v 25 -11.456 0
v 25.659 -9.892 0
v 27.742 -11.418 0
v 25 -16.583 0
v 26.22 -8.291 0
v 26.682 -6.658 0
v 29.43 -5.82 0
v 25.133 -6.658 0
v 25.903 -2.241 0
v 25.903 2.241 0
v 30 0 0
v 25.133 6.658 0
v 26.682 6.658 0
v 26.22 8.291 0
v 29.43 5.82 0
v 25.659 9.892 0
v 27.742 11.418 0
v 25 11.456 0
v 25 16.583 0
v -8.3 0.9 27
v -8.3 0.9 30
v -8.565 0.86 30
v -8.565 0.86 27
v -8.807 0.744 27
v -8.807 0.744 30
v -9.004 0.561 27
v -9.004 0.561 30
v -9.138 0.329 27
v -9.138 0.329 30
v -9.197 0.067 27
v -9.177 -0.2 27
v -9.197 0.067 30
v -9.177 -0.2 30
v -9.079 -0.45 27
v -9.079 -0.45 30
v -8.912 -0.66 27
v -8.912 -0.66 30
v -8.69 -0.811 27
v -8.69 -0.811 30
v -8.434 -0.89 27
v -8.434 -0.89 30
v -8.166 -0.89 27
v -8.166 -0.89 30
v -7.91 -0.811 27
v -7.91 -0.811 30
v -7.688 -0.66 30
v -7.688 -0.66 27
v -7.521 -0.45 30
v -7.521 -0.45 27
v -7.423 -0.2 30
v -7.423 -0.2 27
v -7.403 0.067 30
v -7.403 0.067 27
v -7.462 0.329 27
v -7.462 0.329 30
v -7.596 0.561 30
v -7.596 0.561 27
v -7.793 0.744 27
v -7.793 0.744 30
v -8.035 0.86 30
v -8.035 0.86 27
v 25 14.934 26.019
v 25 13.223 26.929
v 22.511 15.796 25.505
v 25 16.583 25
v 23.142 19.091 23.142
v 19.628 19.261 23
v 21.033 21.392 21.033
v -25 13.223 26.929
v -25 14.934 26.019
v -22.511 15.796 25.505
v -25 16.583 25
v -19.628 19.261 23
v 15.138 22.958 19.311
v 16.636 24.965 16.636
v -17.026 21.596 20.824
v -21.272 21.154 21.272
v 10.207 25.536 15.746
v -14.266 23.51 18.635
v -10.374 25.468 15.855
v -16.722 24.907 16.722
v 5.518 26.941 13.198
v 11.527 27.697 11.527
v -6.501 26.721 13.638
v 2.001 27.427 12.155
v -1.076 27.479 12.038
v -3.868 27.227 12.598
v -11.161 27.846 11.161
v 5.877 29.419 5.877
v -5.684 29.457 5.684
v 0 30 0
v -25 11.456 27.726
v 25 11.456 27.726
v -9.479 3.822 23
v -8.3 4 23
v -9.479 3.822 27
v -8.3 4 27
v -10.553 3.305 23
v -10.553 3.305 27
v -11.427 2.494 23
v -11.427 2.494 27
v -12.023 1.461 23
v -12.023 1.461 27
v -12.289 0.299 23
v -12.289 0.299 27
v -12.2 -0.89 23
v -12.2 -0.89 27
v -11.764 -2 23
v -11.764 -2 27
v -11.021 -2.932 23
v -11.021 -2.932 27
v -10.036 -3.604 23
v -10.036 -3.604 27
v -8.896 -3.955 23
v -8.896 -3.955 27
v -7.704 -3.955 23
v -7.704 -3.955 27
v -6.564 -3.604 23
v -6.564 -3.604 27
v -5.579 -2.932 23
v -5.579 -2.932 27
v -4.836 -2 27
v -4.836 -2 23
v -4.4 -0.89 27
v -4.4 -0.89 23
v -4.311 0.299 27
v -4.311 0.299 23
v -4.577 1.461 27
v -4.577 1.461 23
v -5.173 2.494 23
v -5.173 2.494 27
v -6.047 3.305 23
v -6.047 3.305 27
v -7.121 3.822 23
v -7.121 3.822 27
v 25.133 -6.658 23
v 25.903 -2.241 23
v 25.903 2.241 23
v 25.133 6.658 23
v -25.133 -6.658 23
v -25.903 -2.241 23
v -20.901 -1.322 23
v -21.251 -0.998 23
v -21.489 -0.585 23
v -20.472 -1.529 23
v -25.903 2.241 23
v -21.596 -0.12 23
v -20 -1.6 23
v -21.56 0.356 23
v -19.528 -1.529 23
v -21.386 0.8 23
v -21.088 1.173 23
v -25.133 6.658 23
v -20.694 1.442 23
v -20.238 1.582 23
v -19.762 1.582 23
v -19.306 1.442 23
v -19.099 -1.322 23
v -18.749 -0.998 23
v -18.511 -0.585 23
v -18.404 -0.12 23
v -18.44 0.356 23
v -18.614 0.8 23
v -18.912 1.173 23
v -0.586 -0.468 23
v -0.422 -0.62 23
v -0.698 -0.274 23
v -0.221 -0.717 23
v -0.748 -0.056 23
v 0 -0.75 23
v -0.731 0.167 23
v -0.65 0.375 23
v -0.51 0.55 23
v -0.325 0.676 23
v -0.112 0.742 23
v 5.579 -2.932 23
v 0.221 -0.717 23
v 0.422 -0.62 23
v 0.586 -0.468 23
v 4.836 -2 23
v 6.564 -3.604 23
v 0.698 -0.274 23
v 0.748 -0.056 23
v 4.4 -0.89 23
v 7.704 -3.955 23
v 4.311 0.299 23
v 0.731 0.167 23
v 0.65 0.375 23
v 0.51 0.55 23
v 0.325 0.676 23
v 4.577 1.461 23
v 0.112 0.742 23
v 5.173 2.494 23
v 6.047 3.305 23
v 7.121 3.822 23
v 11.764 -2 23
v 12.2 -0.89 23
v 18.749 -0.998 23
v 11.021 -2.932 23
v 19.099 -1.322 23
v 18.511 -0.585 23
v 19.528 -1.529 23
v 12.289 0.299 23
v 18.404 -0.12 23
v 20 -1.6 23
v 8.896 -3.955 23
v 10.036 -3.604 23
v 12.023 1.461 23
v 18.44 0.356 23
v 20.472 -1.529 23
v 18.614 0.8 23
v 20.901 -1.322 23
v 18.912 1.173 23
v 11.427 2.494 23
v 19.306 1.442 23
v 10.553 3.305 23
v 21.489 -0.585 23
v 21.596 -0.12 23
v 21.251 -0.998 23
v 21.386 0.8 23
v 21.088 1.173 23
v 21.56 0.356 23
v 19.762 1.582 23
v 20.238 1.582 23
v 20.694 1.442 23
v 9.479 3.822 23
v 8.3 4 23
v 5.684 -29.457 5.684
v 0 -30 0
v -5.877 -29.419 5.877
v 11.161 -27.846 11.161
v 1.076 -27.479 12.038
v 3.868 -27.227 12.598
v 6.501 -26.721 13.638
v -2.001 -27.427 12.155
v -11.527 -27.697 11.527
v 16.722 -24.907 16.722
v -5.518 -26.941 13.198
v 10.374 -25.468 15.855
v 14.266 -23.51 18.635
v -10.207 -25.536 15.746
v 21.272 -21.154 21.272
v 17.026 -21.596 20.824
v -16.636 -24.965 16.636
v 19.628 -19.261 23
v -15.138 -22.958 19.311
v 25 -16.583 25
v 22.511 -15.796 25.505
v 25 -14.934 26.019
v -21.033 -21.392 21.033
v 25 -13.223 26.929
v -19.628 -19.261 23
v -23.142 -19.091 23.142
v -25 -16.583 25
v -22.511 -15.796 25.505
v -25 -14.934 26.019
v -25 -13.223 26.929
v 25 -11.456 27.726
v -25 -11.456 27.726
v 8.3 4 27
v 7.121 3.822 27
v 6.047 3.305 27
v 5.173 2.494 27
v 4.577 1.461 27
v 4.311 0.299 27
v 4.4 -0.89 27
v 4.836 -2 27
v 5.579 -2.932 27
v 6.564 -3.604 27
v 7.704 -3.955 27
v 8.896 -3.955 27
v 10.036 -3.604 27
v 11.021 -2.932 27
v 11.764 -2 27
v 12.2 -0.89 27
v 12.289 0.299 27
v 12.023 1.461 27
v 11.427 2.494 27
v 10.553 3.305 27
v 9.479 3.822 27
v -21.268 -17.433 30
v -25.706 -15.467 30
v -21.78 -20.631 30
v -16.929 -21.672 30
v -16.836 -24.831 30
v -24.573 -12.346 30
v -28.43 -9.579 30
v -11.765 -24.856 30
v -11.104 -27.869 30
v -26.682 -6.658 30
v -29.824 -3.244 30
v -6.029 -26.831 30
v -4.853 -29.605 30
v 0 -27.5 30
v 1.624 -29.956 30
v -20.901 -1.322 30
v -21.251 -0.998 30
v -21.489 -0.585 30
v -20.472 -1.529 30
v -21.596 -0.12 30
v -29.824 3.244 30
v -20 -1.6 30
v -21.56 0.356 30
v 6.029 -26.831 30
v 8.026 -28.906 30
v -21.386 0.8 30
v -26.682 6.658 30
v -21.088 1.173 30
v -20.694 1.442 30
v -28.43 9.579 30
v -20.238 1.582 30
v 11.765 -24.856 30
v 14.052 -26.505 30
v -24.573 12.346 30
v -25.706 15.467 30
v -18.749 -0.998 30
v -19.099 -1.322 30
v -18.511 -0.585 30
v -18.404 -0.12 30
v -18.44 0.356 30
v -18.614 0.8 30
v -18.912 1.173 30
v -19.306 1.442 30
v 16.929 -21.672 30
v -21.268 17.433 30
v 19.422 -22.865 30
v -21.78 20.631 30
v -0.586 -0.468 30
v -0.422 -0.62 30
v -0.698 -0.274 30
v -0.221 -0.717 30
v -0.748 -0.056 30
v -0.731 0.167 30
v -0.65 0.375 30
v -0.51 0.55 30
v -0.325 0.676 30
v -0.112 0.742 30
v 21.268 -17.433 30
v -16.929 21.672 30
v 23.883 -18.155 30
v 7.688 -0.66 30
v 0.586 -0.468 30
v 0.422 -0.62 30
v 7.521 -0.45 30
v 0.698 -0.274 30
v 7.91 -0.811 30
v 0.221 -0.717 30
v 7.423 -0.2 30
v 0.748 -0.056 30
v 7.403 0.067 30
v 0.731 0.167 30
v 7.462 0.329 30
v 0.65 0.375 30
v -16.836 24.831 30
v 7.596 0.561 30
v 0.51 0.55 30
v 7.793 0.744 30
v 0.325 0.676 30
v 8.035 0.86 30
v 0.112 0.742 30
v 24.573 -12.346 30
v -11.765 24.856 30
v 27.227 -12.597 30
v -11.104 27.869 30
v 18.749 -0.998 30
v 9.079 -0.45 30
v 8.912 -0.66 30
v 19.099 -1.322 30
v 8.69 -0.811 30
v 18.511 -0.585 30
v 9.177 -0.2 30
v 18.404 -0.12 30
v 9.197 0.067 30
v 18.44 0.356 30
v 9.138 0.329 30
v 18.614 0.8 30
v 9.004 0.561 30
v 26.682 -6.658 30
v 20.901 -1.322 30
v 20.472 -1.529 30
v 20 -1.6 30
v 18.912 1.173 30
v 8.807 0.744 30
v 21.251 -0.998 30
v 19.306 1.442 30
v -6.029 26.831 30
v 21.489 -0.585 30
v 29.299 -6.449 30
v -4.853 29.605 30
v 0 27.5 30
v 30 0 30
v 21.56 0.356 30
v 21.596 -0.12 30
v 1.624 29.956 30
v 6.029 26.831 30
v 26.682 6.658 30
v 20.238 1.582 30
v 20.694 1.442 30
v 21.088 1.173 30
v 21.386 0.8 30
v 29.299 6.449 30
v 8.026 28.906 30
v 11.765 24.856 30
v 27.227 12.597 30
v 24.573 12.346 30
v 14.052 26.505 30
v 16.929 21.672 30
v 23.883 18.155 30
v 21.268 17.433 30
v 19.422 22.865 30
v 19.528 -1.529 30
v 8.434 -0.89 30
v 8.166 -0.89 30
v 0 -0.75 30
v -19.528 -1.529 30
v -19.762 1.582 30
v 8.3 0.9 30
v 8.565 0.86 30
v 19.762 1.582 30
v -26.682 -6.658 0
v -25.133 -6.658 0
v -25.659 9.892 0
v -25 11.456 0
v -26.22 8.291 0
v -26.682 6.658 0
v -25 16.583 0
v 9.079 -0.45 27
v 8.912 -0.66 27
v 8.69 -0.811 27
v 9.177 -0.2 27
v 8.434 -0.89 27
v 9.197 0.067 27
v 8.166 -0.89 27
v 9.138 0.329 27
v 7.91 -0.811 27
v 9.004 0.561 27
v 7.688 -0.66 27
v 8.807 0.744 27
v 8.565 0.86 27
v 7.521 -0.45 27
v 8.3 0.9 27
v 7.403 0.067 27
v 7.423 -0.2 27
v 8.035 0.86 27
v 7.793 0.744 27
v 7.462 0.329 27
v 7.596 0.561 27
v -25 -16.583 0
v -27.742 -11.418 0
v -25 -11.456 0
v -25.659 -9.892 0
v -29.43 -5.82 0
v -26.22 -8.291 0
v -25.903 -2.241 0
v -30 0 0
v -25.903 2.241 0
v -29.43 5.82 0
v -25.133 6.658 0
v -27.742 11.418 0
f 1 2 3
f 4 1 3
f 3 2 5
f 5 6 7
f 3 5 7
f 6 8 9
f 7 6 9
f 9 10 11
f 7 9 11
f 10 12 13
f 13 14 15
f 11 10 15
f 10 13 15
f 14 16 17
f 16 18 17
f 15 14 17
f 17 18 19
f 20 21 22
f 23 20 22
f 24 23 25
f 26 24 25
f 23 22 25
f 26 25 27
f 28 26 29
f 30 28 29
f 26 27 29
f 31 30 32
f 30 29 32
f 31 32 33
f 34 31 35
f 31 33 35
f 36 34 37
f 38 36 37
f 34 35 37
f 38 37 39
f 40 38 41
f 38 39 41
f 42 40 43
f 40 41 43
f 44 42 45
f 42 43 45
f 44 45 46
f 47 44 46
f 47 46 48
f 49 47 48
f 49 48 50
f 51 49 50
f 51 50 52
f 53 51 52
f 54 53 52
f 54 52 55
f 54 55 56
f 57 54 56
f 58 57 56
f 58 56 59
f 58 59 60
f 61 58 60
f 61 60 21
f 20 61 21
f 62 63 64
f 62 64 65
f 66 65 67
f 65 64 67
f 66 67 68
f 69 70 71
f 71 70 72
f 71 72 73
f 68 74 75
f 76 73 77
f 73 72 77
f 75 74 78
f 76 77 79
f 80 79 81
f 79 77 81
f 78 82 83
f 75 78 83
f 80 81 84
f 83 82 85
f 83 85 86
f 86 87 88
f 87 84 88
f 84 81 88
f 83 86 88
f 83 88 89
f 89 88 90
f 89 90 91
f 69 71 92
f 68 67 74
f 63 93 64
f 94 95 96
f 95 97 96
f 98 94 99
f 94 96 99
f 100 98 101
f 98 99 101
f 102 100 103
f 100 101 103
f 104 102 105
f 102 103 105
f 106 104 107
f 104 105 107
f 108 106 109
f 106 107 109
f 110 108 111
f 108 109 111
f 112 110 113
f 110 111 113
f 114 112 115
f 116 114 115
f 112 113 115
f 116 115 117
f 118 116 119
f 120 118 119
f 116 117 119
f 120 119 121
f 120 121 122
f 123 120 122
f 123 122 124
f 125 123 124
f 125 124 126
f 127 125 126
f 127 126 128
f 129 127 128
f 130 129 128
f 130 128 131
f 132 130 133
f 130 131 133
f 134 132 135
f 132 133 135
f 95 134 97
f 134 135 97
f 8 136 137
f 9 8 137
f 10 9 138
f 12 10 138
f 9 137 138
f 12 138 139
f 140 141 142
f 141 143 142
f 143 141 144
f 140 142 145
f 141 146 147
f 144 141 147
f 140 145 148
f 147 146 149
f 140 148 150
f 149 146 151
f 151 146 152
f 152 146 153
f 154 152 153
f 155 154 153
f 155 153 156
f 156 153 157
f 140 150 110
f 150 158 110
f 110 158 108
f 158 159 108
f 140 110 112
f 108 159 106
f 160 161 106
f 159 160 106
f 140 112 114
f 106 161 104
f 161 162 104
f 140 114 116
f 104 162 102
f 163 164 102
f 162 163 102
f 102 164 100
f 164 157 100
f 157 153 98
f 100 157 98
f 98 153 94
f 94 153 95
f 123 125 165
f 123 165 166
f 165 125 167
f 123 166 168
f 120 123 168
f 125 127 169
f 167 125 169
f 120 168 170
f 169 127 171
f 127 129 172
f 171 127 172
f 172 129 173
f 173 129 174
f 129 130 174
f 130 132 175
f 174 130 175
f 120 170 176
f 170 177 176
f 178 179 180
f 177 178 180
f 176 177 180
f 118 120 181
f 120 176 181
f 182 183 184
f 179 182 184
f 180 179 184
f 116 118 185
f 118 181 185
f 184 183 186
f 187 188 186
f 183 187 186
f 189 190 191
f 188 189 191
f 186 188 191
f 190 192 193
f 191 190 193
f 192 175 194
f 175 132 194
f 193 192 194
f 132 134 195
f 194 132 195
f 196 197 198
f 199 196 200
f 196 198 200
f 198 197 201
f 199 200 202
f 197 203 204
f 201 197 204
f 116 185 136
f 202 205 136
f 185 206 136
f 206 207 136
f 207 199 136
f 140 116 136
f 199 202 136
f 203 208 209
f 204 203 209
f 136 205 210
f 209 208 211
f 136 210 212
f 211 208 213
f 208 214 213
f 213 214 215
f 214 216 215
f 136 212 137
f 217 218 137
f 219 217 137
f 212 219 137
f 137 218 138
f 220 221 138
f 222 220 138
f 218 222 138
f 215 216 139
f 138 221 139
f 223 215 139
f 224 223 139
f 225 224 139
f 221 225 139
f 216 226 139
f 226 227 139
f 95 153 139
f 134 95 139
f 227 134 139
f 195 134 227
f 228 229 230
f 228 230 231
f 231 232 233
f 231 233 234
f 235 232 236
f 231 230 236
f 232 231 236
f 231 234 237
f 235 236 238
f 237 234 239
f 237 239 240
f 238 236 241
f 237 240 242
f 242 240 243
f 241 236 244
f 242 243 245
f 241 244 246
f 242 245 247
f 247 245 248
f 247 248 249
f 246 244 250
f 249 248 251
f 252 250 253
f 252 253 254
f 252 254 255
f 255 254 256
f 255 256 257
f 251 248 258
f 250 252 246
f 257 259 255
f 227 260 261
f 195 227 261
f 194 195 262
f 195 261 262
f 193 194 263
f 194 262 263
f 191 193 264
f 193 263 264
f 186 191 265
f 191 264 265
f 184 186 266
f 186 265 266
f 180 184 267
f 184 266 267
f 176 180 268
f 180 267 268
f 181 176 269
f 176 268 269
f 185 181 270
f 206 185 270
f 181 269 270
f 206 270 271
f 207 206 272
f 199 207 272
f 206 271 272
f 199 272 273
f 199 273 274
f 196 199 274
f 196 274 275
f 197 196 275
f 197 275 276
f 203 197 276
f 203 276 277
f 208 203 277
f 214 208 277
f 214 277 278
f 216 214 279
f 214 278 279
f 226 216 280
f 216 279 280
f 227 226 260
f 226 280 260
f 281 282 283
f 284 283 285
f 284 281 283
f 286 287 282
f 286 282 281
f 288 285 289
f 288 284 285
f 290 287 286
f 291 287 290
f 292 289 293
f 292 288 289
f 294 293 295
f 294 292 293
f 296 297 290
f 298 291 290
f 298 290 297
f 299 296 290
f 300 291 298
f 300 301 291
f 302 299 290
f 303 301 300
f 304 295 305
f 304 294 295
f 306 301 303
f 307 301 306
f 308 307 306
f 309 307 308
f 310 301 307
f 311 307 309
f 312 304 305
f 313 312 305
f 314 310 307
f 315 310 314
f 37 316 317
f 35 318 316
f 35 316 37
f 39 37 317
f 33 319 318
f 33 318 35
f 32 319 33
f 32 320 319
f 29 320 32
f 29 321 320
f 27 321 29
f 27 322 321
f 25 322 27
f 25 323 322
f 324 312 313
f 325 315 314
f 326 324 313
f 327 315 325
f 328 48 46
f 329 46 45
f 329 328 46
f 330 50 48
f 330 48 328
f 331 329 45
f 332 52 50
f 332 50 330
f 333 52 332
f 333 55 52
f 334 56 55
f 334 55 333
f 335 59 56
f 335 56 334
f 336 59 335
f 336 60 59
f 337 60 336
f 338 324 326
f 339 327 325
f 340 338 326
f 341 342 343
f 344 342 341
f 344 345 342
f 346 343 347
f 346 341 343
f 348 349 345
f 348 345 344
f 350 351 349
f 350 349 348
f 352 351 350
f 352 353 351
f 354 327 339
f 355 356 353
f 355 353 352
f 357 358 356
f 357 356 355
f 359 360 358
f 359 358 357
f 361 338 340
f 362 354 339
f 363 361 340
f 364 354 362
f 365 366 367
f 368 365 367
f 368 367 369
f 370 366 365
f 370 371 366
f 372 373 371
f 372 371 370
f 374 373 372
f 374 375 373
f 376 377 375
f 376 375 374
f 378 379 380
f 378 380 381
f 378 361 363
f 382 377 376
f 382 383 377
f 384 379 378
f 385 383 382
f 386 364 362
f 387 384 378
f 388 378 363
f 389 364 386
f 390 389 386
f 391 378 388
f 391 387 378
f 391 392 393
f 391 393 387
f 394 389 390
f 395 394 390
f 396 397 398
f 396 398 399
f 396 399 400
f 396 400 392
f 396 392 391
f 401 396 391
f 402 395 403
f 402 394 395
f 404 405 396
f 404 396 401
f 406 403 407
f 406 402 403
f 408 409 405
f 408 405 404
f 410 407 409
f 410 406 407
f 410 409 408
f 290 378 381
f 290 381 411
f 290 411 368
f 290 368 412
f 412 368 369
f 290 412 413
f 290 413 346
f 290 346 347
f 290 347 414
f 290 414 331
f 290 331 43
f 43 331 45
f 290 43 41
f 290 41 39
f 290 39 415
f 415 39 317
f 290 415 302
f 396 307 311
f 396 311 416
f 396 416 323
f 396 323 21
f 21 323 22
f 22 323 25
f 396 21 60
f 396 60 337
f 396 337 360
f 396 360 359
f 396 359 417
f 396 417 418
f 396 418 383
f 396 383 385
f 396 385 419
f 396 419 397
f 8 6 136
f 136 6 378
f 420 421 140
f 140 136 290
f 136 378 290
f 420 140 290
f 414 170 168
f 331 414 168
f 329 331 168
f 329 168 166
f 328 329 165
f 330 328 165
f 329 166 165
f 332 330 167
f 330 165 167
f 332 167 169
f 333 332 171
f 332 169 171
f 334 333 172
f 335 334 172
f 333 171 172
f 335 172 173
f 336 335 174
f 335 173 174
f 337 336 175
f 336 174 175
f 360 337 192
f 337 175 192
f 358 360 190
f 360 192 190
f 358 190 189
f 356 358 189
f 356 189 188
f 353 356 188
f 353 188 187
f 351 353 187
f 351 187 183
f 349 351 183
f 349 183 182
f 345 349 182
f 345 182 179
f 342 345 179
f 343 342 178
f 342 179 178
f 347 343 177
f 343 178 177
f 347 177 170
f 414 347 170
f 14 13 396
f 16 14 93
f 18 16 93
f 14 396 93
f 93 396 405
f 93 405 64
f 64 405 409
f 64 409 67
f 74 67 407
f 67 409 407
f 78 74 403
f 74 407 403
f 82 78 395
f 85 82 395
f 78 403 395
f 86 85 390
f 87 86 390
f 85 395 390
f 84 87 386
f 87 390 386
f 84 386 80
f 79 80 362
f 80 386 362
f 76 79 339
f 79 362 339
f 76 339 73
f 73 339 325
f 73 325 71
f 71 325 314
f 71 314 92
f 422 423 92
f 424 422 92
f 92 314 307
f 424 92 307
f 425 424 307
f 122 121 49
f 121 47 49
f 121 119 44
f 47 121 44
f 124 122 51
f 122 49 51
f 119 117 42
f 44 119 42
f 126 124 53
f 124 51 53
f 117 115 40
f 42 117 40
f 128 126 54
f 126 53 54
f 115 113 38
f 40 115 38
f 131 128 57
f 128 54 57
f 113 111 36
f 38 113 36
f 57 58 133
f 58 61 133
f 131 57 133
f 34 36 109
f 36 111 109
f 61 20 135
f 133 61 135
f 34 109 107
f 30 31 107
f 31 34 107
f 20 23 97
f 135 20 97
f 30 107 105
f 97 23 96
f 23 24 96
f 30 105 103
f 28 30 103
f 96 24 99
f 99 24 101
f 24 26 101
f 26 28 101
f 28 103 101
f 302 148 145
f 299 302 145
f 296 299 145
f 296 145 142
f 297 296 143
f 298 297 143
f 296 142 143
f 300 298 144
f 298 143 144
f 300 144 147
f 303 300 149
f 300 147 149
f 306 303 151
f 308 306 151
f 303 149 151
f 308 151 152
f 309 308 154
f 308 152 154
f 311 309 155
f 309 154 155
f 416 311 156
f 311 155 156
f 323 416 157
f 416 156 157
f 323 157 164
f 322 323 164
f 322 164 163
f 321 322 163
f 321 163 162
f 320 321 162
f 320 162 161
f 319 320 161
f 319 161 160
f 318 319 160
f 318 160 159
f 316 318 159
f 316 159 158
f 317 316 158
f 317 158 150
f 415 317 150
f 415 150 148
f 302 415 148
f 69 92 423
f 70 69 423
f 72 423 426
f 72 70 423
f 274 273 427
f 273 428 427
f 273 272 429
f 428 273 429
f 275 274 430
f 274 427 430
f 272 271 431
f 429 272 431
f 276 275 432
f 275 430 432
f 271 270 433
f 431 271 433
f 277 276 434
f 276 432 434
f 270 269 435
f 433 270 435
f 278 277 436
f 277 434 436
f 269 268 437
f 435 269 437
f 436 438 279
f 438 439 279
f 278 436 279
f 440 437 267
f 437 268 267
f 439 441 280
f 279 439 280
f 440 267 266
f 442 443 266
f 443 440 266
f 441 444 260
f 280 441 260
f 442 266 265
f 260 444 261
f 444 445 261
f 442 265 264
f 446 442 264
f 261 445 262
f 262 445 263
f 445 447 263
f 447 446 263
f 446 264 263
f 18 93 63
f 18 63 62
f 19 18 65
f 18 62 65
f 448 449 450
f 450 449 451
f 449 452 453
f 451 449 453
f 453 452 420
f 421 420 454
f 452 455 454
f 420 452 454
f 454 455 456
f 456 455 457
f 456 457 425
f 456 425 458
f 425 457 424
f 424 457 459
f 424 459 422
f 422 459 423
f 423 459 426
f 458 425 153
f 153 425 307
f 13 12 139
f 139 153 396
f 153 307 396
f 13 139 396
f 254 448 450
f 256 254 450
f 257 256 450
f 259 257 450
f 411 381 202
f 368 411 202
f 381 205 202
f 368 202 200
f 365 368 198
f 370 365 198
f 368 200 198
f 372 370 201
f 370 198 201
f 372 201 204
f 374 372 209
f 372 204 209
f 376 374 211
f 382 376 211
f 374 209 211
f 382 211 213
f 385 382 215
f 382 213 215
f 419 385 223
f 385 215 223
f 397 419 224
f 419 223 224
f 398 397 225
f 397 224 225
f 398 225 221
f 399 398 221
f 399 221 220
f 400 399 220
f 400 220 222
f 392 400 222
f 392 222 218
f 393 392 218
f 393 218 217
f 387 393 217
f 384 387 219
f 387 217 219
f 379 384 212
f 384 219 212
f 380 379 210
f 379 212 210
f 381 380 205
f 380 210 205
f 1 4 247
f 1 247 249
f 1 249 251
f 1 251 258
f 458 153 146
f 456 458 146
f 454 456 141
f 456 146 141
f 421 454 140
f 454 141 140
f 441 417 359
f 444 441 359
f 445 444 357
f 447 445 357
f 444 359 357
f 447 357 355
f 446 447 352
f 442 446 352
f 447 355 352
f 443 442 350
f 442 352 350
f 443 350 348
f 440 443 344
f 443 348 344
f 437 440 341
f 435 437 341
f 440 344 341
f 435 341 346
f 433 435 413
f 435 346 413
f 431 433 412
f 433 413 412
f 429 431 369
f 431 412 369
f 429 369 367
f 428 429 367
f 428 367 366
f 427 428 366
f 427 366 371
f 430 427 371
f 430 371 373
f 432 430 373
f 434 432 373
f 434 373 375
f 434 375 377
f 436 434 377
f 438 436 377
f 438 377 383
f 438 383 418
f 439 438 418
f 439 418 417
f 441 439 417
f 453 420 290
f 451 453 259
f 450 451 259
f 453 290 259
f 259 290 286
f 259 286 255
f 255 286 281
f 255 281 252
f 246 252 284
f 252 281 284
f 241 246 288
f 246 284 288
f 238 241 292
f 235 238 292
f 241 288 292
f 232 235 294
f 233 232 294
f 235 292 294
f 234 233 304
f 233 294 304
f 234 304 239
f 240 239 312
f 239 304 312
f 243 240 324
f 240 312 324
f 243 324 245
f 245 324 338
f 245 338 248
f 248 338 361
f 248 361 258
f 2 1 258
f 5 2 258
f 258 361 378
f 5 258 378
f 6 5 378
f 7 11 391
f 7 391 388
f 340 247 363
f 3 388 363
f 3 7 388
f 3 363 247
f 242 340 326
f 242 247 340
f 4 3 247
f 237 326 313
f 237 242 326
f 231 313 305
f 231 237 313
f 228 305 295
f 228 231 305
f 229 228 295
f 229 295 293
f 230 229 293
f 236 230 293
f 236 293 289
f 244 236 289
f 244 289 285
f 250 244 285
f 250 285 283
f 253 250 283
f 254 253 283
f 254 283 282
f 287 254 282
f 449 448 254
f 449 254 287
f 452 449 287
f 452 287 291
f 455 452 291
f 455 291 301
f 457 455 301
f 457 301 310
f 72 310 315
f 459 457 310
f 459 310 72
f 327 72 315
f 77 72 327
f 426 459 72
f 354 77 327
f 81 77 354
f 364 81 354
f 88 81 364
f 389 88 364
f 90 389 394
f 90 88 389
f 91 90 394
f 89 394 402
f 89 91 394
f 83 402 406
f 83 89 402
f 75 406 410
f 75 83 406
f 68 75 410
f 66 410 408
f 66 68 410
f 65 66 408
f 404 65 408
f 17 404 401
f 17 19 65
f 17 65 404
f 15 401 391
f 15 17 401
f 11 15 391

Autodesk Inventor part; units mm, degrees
ref_plane "YZ Plane" through (0, 0, 0) normal (1, 0, 0) x (0, 1, 0)
ref_plane "XZ Plane" through (0, 0, 0) normal (0, 1, 0) x (-1, 0, 0)
ref_plane "XY Plane" through (0, 0, 0) normal (0, 0, 1) x (1, 0, 0)
sketch "スケッチ1" plane through (0, 0, 0) normal (0, 0, 1) x (1, 0, 0)
  circle A0 centre (0, 0) radius 30
  dimension "d0" = 60
extrude "押し出し1" add sketch "スケッチ1" along normal blind 30
sketch "スケッチ2" plane through (0, 0, 30) normal (0, 0, 1) x (1, 0, 0)
  circle A0 centre (0, 0) radius 26
  dimension "d3" = 52
extrude "押し出し2" cut sketch "スケッチ2" against normal blind 50
sketch "スケッチ3" plane through (0, 0, 0) normal (0, 0, 1) x (1, 0, 0)
  point P0 (0, 0)
sketch "スケッチ4" plane through (0, 0, 0) normal (1, 0, 0) x (0, 1, 0)
  line L0 (30, 0) -> (-30, 0) projected
  line L1 (-30, 0) -> (-30, 30) projected
  arc A0 (30, 0) -> (-30, 0) centre (0, 0) ccw
  dimension "d6" = 30
extrude "押し出し3" cut sketch "スケッチ4" along normal mid plane 50
sketch "スケッチ5" plane through (0, 0, 30) normal (0, 0, 1) x (1, 0, 0)
  circle A0 centre (0, 0) radius 27.5
extrude "押し出し4" add sketch "スケッチ5" against normal blind 7
sketch "スケッチ19" plane through (0, 0, 30) normal (0, 0, 1) x (1, 0, 0)
  circle A0 centre (0, 0) radius 27.5
  line L0 (27.5, -6.6575) -> (-27.5, -6.6575)
  line L1 (-27.5, -6.6575) -> (-27.5, 6.6575)
  line L2 (-27.5, 6.6575) -> (27.5, 6.6575)
  line L3 (27.5, 6.6575) -> (27.5, -6.6575)
  line L4 (27.5, -6.6575) -> (-27.5, 6.6575) construction
  line L5 (-27.5, -6.6575) -> (27.5, 6.6575) construction
  point P0 (26.682, -6.6575)
  point P1 (-26.682, -6.6575)
  point P2 (-26.682, 6.6575)
  point P3 (26.682, 6.6575)
extrude "押し出し11" cut sketch "スケッチ19" against normal blind 60 contours L2 A0 | A0 L0
sketch "スケッチ22" plane through (0, 0, 30) normal (0, 0, 1) x (1, 0, 0)
  point P0 (0, 0)
sketch "スケッチ23" plane through (0, 0, 30) normal (0, 0, 1) x (1, 0, 0)
  point P0 (0, 0)
  point P1 (-20, 0)
  point P2 (20, 0)
  dimension "d67" = 20
  dimension "d68" = 20
hole "穴4" at (-20, 0, 30) at (20, 0, 30) direction (0, 0, -1) diameter 3.2 depth 8.8 tip angle 118
sketch "スケッチ25" plane through (0, 0, 30) normal (0, 0, 1) x (1, 0, 0)
  point P0 (0, 0)
  point P1 (0, 0)
hole "穴5" at (0, 0, 30) direction (0, 0, -1) diameter 1.5 depth 8.8 tip angle 118
sketch "スケッチ27" plane through (0, 0, 23) normal (0, 0, -1) x (-1, 0, 0)
  point P0 (0, 0)
  point P1 (8.3, 0)
  point P2 (-8.3, 0)
  dimension "d95" = 8.3
  dimension "d96" = 8.3
hole "穴7" at (-8.3, 0, 23) at (8.3, 0, 23) direction (0, 0, 1) diameter 1.8 depth 8.8 tip angle 118 counterbore diameter 8 counterbore depth 4
properties part number "20220527_仮筒"
